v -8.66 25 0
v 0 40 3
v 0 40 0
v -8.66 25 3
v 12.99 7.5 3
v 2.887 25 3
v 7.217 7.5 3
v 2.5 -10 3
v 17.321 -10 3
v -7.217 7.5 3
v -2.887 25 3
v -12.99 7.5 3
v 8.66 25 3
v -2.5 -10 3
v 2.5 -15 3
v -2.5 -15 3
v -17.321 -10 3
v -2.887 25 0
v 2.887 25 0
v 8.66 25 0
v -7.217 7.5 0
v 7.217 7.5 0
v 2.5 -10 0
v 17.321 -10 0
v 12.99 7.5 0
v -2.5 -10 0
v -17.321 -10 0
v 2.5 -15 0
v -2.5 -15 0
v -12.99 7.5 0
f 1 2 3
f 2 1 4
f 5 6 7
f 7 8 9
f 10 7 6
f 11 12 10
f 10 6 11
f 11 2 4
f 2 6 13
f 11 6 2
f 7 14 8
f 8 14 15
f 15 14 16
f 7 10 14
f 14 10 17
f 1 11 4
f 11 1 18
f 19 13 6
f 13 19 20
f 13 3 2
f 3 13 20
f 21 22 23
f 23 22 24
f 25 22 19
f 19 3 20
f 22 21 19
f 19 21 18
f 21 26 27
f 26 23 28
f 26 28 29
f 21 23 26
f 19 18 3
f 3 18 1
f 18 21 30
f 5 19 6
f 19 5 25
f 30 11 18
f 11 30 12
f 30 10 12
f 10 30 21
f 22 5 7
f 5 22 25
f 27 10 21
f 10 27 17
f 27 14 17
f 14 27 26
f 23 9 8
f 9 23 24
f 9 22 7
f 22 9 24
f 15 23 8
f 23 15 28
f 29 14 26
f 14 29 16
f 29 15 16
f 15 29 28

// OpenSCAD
// file: ../../triangle/triangle.scad
module triangle(size, height)
{
    rotate([0, 0, 90])
    cylinder(r=size, 
             $fn=3,
             h=height);
}
// main file
use <../../triangle/triangle.scad>

christmasTree();

module christmasTree(height = 3)
{
    union()
    {
        // top triangle
        translate([0, 30, 0])
        triangle(10, height);
        
        // middle triangle
        translate([0, 15, 0])
        color("green")
        triangle(15, height);
        
        // bottom triangle
        triangle(20, height);
        
        // trunk
        color("brown")
        translate([-2.5, -15, 0])
        cube([5,6, height]);
    }
}
